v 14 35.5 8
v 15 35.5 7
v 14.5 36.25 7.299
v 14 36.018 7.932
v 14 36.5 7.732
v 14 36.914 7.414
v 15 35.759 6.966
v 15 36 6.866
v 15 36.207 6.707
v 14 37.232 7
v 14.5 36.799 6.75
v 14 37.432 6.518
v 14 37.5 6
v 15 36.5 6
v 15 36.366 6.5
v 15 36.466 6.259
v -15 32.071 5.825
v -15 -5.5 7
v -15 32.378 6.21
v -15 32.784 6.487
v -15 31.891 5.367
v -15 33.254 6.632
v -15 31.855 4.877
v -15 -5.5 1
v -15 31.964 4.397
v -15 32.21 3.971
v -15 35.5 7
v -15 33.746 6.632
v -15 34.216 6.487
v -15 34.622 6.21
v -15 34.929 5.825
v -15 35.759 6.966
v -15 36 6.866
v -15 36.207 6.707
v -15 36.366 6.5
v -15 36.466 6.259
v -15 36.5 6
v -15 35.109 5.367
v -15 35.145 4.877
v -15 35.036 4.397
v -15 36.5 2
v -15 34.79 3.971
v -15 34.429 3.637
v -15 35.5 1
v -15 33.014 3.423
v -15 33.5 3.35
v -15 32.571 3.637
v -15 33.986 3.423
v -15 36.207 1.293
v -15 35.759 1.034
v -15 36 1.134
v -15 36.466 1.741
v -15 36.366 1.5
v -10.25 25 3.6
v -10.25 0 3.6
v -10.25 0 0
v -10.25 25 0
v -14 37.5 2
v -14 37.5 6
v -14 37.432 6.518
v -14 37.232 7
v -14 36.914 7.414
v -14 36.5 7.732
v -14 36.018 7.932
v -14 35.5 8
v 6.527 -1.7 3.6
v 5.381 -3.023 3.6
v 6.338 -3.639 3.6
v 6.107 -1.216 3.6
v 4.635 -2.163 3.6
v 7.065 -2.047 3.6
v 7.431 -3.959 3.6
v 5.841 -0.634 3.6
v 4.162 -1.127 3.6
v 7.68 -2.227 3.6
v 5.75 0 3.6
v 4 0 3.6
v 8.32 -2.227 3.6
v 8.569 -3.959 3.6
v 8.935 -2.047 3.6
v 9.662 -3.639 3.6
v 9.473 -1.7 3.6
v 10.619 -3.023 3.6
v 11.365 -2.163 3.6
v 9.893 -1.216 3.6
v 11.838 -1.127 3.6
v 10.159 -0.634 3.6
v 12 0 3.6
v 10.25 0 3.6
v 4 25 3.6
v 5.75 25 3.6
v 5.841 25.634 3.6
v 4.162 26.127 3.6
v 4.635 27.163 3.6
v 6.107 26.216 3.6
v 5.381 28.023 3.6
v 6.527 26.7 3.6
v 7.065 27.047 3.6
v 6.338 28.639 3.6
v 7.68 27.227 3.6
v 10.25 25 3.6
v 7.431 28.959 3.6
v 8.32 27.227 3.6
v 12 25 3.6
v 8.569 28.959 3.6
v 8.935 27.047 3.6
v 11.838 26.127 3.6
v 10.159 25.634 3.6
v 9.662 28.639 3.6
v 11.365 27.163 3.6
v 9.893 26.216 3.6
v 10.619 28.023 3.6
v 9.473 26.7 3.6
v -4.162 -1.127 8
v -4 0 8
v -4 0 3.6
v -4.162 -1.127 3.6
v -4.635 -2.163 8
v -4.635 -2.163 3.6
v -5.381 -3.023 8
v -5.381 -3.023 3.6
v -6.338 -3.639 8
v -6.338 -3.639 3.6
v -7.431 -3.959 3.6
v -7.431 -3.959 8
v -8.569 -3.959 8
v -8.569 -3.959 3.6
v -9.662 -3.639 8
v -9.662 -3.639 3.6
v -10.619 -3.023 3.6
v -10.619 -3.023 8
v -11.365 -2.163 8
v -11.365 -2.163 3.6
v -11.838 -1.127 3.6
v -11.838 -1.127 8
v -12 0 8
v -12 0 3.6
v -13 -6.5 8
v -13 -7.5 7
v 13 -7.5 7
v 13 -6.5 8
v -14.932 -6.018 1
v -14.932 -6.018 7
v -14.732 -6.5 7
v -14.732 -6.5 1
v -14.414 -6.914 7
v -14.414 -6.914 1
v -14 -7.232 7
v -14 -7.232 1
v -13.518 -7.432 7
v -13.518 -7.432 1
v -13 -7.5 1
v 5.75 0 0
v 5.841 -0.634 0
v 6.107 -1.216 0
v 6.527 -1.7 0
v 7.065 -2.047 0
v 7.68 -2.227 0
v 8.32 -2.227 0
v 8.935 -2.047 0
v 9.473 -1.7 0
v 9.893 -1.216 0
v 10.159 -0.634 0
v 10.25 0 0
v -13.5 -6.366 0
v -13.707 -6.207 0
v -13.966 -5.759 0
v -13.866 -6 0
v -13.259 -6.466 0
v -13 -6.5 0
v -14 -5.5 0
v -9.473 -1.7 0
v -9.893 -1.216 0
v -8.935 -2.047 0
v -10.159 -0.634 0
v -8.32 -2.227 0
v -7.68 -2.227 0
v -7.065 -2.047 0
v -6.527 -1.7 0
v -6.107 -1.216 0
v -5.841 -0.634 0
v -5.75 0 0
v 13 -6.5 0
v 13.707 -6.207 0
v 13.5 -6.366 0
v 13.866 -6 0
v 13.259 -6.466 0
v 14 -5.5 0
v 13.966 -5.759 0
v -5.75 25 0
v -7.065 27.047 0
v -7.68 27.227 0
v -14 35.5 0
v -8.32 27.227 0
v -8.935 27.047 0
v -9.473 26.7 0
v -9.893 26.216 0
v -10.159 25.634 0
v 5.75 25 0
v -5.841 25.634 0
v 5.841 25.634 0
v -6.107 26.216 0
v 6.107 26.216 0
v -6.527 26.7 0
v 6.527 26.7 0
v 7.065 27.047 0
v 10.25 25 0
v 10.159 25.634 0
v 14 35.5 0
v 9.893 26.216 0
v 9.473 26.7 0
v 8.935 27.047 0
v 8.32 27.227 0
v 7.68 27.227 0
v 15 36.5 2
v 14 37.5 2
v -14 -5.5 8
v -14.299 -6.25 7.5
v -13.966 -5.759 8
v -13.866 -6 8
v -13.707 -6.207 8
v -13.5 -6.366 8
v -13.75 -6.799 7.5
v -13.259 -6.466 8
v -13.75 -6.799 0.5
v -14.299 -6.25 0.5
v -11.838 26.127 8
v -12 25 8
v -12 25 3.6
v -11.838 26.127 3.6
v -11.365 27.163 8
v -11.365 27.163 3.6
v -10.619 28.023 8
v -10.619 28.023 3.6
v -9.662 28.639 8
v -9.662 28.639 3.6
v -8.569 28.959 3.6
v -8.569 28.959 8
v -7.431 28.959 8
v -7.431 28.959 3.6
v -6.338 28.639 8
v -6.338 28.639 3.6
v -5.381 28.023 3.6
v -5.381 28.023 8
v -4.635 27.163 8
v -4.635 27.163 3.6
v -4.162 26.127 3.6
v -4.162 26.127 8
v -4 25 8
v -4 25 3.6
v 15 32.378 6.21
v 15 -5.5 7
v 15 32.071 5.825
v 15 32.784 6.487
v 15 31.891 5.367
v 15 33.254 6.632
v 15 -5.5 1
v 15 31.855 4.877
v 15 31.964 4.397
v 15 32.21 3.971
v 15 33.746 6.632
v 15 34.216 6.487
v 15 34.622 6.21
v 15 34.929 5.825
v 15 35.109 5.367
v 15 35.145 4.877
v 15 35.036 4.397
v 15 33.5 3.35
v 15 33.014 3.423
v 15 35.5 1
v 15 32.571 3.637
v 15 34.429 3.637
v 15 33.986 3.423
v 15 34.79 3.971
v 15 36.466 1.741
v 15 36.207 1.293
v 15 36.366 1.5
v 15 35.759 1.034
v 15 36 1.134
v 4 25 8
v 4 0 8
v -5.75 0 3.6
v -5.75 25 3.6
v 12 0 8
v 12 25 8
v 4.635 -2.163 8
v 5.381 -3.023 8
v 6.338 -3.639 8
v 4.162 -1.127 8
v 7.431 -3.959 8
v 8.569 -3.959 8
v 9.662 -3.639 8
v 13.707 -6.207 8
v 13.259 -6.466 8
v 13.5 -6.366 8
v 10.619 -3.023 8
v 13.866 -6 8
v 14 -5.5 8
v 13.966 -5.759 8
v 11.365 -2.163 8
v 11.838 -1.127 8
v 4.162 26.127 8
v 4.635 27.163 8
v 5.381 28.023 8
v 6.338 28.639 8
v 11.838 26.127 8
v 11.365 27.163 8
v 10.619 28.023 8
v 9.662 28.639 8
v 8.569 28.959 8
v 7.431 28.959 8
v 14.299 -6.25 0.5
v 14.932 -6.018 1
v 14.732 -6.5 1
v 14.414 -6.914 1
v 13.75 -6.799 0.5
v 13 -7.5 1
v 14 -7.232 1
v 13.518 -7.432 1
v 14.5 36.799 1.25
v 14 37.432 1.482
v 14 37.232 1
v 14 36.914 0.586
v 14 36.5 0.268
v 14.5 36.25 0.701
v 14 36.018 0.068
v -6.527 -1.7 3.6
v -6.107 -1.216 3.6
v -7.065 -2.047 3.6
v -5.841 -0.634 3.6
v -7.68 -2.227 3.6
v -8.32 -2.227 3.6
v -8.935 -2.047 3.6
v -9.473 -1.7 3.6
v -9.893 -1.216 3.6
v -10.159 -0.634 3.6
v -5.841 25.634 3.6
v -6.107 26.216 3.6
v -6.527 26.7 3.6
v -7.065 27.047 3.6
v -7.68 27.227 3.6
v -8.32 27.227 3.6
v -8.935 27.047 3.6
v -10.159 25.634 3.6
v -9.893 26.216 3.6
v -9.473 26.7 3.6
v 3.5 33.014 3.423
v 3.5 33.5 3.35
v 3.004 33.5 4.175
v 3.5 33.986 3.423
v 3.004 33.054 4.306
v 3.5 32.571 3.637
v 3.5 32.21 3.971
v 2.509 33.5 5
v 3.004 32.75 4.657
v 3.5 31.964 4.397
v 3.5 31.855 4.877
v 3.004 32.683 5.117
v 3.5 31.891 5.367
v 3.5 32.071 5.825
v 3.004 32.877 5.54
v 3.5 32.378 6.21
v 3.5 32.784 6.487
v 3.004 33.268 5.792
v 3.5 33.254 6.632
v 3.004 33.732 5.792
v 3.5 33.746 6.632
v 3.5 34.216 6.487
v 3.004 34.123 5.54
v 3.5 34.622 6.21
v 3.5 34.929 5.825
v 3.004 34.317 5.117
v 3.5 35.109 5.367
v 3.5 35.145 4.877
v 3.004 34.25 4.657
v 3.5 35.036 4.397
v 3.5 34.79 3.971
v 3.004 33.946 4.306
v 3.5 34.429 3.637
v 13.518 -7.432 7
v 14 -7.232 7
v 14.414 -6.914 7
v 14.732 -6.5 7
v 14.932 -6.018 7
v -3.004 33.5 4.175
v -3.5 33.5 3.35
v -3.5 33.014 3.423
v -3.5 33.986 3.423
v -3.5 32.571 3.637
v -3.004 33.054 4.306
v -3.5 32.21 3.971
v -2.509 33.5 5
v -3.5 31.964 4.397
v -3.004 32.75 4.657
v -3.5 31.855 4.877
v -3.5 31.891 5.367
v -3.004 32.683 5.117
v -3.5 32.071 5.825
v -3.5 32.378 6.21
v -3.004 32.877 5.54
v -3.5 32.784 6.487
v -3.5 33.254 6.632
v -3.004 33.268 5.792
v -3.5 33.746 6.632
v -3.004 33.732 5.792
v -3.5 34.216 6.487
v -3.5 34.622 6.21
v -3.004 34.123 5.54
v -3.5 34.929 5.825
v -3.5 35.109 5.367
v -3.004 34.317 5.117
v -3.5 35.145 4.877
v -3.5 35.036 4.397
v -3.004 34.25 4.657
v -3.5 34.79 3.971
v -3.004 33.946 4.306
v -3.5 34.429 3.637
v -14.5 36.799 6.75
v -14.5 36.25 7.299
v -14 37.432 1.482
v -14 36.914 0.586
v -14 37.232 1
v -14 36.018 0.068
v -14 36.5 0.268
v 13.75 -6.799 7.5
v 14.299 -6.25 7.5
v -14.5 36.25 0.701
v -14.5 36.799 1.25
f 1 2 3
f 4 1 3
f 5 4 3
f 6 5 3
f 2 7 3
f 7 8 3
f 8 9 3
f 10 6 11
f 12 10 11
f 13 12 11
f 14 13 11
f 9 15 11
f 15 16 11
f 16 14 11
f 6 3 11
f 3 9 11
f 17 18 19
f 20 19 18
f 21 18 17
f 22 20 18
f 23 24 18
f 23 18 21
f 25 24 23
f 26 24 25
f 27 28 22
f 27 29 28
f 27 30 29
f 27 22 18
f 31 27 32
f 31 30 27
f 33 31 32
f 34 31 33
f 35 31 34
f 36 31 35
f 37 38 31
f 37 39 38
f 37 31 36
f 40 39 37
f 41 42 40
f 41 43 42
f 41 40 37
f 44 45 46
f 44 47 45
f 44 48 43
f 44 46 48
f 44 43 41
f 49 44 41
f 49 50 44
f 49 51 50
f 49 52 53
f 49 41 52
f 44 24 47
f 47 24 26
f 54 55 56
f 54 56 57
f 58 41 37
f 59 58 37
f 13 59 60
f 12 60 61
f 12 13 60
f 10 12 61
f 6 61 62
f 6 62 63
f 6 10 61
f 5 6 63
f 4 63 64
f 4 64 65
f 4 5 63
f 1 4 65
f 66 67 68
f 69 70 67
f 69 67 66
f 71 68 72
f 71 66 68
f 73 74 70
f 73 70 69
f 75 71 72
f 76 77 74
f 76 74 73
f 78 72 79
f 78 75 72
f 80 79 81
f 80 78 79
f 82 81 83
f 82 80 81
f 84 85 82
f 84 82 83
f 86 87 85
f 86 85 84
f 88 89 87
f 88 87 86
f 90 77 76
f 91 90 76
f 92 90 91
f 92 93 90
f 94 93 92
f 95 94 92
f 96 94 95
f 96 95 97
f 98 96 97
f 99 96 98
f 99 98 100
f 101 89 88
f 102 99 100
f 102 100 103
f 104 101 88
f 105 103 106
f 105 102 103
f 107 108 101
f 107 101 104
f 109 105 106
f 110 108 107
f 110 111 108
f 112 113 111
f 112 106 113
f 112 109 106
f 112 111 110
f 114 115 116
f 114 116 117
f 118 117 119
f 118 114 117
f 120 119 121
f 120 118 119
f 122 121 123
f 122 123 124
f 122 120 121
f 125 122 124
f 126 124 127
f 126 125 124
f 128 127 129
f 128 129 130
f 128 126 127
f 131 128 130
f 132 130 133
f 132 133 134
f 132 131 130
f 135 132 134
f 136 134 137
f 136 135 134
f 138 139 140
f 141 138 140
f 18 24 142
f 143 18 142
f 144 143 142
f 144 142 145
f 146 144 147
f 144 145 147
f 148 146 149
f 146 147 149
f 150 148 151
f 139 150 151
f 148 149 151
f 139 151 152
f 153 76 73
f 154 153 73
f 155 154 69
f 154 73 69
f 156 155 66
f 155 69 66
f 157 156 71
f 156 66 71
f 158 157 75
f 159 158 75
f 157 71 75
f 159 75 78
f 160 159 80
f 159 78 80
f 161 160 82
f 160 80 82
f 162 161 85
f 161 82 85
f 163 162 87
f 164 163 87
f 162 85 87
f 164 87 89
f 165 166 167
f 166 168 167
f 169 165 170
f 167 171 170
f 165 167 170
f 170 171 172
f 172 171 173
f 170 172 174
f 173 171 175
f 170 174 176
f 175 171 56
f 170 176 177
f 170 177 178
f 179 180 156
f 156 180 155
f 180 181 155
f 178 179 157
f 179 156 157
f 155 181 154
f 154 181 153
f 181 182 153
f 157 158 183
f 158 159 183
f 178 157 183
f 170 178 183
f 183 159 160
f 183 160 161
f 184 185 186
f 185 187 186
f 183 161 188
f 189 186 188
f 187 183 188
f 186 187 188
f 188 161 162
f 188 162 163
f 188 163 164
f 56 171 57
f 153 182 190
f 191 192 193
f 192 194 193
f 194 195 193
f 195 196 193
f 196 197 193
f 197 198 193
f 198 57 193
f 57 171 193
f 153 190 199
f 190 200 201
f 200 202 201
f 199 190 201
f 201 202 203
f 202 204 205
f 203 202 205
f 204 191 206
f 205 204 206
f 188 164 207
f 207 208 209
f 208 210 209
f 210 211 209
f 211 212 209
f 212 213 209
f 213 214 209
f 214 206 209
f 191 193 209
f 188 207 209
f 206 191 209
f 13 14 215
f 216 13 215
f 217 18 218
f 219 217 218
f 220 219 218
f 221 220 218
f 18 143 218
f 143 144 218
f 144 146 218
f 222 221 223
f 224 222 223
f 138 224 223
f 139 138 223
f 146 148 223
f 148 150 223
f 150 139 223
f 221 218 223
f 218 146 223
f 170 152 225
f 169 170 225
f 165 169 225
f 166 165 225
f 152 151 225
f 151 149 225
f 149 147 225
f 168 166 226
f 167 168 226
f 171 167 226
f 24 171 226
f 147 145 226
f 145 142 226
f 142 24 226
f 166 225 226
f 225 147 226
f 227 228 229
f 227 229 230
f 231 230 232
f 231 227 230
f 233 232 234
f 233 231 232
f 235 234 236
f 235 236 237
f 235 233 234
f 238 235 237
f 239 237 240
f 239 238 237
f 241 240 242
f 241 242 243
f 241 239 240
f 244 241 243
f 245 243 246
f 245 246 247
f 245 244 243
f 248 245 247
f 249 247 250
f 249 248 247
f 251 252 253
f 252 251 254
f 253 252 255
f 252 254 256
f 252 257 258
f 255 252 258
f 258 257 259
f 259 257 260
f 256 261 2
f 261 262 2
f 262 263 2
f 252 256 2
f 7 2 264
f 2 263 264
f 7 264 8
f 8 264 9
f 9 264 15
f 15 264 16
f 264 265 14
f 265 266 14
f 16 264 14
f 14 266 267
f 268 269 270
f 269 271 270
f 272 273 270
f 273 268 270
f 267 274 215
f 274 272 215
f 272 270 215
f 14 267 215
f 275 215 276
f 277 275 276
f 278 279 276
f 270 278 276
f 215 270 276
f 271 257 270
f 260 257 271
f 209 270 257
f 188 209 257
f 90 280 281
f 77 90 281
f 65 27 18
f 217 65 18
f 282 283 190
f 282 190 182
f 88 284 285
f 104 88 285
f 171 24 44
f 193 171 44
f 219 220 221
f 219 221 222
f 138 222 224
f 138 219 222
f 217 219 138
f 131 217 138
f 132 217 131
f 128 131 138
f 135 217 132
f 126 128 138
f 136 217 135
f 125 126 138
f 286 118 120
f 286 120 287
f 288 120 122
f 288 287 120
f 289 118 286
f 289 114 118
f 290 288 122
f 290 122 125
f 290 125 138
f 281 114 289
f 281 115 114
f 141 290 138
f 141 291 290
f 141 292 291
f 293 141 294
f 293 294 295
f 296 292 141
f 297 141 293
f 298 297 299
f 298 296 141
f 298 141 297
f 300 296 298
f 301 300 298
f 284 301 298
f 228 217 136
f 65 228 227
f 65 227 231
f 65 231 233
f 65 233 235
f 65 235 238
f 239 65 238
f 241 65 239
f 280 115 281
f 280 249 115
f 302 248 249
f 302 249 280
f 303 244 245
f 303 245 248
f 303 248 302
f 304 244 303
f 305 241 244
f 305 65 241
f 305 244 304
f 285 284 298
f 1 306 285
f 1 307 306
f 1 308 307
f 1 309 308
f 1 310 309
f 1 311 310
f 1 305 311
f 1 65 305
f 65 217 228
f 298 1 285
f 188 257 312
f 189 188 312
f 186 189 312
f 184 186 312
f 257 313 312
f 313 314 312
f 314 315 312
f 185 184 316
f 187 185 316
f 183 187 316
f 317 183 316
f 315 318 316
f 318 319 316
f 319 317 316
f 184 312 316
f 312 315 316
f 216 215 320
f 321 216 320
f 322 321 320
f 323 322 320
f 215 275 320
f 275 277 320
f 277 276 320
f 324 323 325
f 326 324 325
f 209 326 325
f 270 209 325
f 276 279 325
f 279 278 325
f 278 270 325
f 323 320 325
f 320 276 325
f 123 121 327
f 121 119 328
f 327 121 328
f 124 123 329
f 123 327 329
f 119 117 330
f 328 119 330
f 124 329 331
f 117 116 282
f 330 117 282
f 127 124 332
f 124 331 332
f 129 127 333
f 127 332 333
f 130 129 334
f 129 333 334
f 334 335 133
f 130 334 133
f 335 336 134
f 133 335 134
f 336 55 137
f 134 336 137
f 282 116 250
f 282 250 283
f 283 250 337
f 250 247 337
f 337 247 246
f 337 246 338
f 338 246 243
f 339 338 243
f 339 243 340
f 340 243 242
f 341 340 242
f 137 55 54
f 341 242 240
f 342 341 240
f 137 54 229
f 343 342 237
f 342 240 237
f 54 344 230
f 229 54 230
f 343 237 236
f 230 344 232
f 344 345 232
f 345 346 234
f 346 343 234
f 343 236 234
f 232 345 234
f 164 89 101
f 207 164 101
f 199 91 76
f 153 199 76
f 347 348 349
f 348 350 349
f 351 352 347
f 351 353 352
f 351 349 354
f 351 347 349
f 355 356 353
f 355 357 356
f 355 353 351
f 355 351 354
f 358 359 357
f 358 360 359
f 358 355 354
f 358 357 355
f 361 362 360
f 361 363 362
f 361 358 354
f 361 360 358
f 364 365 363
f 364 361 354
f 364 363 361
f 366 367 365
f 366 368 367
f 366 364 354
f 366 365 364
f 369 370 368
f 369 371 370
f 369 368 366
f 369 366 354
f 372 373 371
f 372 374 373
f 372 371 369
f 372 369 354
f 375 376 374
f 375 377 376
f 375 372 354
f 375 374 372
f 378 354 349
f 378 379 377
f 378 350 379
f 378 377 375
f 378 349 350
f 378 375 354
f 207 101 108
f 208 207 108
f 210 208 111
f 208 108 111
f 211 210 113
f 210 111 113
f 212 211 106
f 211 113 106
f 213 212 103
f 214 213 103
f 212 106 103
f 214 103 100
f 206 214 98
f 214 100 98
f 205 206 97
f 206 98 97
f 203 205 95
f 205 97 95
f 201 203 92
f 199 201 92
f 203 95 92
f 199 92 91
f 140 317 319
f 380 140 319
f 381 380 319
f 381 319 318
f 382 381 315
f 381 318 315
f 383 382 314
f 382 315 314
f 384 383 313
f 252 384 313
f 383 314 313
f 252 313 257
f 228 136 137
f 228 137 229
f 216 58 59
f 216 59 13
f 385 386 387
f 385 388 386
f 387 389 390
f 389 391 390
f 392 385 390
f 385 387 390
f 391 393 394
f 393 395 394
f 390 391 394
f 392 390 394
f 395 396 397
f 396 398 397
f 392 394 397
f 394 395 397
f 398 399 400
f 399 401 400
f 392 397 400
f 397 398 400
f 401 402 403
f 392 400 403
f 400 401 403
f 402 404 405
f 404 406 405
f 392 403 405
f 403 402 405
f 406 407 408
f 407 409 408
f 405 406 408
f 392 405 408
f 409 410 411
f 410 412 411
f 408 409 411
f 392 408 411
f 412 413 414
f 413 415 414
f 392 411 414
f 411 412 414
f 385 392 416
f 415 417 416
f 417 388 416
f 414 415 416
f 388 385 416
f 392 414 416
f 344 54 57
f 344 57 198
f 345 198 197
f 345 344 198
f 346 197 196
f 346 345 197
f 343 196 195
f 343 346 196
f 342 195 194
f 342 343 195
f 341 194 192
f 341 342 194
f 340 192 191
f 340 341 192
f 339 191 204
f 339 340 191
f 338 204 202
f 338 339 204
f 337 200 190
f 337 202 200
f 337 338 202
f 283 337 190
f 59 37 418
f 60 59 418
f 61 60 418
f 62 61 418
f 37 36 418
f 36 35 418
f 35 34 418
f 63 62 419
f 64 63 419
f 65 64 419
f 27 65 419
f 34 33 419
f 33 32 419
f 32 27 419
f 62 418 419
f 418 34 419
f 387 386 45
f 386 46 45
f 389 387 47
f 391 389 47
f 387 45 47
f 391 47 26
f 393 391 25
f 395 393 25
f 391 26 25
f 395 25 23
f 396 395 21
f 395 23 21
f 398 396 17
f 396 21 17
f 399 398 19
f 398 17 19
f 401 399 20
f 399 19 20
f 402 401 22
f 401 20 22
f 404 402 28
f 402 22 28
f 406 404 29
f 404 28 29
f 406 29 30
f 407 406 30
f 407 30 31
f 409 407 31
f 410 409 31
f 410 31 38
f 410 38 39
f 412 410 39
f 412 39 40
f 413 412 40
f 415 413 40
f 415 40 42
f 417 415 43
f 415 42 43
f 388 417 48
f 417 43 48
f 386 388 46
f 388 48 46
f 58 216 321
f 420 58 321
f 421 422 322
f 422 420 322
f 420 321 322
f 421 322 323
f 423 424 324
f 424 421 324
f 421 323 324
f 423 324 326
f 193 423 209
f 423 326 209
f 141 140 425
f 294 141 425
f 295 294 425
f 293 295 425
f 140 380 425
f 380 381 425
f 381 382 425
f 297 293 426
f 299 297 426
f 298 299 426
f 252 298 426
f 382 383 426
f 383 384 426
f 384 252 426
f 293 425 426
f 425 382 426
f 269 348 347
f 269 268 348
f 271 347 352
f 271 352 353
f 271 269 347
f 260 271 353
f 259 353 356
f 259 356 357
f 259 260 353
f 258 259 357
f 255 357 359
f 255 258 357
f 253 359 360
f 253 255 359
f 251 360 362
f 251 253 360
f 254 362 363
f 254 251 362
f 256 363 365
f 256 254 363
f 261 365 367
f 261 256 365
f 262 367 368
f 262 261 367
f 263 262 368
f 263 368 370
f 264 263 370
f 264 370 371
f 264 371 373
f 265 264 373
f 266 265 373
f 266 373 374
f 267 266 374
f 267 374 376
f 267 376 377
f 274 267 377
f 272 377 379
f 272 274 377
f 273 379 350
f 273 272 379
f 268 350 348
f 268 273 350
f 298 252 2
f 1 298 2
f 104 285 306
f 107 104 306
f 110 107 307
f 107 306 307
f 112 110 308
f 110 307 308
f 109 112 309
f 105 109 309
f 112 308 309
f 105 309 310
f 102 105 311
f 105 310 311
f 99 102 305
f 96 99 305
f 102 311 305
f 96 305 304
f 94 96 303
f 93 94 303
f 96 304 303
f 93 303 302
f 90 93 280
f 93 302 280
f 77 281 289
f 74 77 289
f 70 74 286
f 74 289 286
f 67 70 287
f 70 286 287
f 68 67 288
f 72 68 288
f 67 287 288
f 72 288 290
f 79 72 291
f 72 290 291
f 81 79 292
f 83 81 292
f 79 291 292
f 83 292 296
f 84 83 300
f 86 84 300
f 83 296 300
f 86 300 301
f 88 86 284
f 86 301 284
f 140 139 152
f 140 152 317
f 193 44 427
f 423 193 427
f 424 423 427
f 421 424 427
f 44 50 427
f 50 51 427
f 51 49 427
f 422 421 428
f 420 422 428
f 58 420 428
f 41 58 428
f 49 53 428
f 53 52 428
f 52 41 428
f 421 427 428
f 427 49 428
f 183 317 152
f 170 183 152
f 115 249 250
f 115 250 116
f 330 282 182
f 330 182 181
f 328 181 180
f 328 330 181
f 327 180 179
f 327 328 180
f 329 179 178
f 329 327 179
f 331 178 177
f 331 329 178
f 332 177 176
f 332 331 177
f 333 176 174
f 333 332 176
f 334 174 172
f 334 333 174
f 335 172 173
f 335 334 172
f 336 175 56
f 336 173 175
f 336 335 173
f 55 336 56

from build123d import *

# Parameters (mm, degrees)
SKETCH1_W           = 30
SKETCH1_H           = 75
BOSS_EXTRUDE1_DEPTH = 8
FILLET2_R           = 2
CUT_EXTRUDE3_DEPTH  = 4.4
CUT_EXTRUDE4_DEPTH  = 4.4
SKETCH11_W          = 30
SKETCH11_H          = 30
CUT_EXTRUDE5_DEPTH  = 29.4
FILLET3_R           = 2
CHAMFER1_SIZE       = 1


with BuildPart() as part:
    # Sketch1 → Boss-Extrude1 (new body)
    with BuildSketch(Plane.XY):
        Rectangle(SKETCH1_W, SKETCH1_H)
    extrude(amount=BOSS_EXTRUDE1_DEPTH)

    # Sketch3 → M4 Tapped Hole1 (revolve, cut)
    with BuildSketch(Plane(origin=(15, 33.5, 5), x_dir=(0, 0, -1), z_dir=(0, 1, 0))):
        Polygon((0, 0), (0, 12.491420021), (1.65, 11.5), (1.65, 0), align=None)
    m4_tapped_hole1 = revolve(axis=Axis((21.35, 33.5, 5), (-1, 0, 0)), mode=Mode.SUBTRACT)

    # Fillet2
    fillet2_edges = [part.edges().sort_by_distance(p)[0] for p in [
        (0, 37.5, 0),
        (0, 37.5, 8),
    ]]
    fillet(fillet2_edges, radius=FILLET2_R)

    # Sketch9 → Cut-Extrude3 (cut)
    with BuildSketch(Plane.XY.offset(8)):
        with BuildLine():
            Line((-12, 0), (-12, 25))
            ThreePointArc((-12, 25), (-8, 29), (-4, 25))
            Line((-4, 25), (-4, 0))
            ThreePointArc((-4, 0), (-8, -4), (-12, 0))
        make_face()
        with BuildLine():
            Line((12, 0), (12, 25))
            ThreePointArc((12, 25), (8, 29), (4, 25))
            Line((4, 25), (4, 0))
            ThreePointArc((4, 0), (8, -4), (12, 0))
        make_face()
    extrude(amount=-CUT_EXTRUDE3_DEPTH, mode=Mode.SUBTRACT)

    # Sketch10 → Cut-Extrude4 (cut)
    with BuildSketch(Plane.XY.offset(3.6)):
        with BuildLine():
            Line((-5.75, 25), (-5.75, 0))
            ThreePointArc((-5.75, 0), (-8, -2.25), (-10.25, 0))
            Line((-10.25, 0), (-10.25, 25))
            ThreePointArc((-10.25, 25), (-8, 27.25), (-5.75, 25))
        make_face()
        with BuildLine():
            Line((5.75, 25), (5.75, 0))
            ThreePointArc((5.75, 0), (8, -2.25), (10.25, 0))
            Line((10.25, 0), (10.25, 25))
            ThreePointArc((10.25, 25), (8, 27.25), (5.75, 25))
        make_face()
    extrude(amount=-CUT_EXTRUDE4_DEPTH, mode=Mode.SUBTRACT)

    # Sketch11 → Cut-Extrude5 (cut)
    with BuildSketch(Plane.XY.offset(8)):
        with Locations((0, -22.5)):
            Rectangle(SKETCH11_W, SKETCH11_H)
    extrude(amount=-CUT_EXTRUDE5_DEPTH, mode=Mode.SUBTRACT)

    # Fillet3
    fillet3_edges = [part.edges().sort_by_distance(p)[0] for p in [
        (15, -7.5, 4),
        (-15, -7.5, 4),
    ]]
    fillet(fillet3_edges, radius=FILLET3_R)

    # Mirror1: M4 Tapped Hole1 across plane
    add(m4_tapped_hole1.mirror(Plane(origin=(0, 0, 0), x_dir=(0, 0, 1), z_dir=(1, 0, 0))), mode=Mode.SUBTRACT)

    # Chamfer1
    chamfer1_edges = [part.edges().sort_by_distance(p)[0] for p in [
        (0, -7.5, 8),
        (0, -7.5, 0),
        (15, 15, 8),
        (-14.414213562, -6.914213562, 8),
        (14.414213562, -6.914213562, 8),
        (15, 15, 0),
        (-14.414213562, -6.914213562, 0),
        (14.414213562, -6.914213562, 0),
        (-15, 37.5, 4),
        (15, 37.5, 4),
        (-15, 15, 0),
        (-15, 15, 8),
        (-15, 36.914213562, 7.414213562),
        (-15, 36.914213562, 0.585786438),
        (15, 36.914213562, 7.414213562),
        (15, 36.914213562, 0.585786438),
    ]]
    chamfer(chamfer1_edges, length=CHAMFER1_SIZE)


solid = part.part
